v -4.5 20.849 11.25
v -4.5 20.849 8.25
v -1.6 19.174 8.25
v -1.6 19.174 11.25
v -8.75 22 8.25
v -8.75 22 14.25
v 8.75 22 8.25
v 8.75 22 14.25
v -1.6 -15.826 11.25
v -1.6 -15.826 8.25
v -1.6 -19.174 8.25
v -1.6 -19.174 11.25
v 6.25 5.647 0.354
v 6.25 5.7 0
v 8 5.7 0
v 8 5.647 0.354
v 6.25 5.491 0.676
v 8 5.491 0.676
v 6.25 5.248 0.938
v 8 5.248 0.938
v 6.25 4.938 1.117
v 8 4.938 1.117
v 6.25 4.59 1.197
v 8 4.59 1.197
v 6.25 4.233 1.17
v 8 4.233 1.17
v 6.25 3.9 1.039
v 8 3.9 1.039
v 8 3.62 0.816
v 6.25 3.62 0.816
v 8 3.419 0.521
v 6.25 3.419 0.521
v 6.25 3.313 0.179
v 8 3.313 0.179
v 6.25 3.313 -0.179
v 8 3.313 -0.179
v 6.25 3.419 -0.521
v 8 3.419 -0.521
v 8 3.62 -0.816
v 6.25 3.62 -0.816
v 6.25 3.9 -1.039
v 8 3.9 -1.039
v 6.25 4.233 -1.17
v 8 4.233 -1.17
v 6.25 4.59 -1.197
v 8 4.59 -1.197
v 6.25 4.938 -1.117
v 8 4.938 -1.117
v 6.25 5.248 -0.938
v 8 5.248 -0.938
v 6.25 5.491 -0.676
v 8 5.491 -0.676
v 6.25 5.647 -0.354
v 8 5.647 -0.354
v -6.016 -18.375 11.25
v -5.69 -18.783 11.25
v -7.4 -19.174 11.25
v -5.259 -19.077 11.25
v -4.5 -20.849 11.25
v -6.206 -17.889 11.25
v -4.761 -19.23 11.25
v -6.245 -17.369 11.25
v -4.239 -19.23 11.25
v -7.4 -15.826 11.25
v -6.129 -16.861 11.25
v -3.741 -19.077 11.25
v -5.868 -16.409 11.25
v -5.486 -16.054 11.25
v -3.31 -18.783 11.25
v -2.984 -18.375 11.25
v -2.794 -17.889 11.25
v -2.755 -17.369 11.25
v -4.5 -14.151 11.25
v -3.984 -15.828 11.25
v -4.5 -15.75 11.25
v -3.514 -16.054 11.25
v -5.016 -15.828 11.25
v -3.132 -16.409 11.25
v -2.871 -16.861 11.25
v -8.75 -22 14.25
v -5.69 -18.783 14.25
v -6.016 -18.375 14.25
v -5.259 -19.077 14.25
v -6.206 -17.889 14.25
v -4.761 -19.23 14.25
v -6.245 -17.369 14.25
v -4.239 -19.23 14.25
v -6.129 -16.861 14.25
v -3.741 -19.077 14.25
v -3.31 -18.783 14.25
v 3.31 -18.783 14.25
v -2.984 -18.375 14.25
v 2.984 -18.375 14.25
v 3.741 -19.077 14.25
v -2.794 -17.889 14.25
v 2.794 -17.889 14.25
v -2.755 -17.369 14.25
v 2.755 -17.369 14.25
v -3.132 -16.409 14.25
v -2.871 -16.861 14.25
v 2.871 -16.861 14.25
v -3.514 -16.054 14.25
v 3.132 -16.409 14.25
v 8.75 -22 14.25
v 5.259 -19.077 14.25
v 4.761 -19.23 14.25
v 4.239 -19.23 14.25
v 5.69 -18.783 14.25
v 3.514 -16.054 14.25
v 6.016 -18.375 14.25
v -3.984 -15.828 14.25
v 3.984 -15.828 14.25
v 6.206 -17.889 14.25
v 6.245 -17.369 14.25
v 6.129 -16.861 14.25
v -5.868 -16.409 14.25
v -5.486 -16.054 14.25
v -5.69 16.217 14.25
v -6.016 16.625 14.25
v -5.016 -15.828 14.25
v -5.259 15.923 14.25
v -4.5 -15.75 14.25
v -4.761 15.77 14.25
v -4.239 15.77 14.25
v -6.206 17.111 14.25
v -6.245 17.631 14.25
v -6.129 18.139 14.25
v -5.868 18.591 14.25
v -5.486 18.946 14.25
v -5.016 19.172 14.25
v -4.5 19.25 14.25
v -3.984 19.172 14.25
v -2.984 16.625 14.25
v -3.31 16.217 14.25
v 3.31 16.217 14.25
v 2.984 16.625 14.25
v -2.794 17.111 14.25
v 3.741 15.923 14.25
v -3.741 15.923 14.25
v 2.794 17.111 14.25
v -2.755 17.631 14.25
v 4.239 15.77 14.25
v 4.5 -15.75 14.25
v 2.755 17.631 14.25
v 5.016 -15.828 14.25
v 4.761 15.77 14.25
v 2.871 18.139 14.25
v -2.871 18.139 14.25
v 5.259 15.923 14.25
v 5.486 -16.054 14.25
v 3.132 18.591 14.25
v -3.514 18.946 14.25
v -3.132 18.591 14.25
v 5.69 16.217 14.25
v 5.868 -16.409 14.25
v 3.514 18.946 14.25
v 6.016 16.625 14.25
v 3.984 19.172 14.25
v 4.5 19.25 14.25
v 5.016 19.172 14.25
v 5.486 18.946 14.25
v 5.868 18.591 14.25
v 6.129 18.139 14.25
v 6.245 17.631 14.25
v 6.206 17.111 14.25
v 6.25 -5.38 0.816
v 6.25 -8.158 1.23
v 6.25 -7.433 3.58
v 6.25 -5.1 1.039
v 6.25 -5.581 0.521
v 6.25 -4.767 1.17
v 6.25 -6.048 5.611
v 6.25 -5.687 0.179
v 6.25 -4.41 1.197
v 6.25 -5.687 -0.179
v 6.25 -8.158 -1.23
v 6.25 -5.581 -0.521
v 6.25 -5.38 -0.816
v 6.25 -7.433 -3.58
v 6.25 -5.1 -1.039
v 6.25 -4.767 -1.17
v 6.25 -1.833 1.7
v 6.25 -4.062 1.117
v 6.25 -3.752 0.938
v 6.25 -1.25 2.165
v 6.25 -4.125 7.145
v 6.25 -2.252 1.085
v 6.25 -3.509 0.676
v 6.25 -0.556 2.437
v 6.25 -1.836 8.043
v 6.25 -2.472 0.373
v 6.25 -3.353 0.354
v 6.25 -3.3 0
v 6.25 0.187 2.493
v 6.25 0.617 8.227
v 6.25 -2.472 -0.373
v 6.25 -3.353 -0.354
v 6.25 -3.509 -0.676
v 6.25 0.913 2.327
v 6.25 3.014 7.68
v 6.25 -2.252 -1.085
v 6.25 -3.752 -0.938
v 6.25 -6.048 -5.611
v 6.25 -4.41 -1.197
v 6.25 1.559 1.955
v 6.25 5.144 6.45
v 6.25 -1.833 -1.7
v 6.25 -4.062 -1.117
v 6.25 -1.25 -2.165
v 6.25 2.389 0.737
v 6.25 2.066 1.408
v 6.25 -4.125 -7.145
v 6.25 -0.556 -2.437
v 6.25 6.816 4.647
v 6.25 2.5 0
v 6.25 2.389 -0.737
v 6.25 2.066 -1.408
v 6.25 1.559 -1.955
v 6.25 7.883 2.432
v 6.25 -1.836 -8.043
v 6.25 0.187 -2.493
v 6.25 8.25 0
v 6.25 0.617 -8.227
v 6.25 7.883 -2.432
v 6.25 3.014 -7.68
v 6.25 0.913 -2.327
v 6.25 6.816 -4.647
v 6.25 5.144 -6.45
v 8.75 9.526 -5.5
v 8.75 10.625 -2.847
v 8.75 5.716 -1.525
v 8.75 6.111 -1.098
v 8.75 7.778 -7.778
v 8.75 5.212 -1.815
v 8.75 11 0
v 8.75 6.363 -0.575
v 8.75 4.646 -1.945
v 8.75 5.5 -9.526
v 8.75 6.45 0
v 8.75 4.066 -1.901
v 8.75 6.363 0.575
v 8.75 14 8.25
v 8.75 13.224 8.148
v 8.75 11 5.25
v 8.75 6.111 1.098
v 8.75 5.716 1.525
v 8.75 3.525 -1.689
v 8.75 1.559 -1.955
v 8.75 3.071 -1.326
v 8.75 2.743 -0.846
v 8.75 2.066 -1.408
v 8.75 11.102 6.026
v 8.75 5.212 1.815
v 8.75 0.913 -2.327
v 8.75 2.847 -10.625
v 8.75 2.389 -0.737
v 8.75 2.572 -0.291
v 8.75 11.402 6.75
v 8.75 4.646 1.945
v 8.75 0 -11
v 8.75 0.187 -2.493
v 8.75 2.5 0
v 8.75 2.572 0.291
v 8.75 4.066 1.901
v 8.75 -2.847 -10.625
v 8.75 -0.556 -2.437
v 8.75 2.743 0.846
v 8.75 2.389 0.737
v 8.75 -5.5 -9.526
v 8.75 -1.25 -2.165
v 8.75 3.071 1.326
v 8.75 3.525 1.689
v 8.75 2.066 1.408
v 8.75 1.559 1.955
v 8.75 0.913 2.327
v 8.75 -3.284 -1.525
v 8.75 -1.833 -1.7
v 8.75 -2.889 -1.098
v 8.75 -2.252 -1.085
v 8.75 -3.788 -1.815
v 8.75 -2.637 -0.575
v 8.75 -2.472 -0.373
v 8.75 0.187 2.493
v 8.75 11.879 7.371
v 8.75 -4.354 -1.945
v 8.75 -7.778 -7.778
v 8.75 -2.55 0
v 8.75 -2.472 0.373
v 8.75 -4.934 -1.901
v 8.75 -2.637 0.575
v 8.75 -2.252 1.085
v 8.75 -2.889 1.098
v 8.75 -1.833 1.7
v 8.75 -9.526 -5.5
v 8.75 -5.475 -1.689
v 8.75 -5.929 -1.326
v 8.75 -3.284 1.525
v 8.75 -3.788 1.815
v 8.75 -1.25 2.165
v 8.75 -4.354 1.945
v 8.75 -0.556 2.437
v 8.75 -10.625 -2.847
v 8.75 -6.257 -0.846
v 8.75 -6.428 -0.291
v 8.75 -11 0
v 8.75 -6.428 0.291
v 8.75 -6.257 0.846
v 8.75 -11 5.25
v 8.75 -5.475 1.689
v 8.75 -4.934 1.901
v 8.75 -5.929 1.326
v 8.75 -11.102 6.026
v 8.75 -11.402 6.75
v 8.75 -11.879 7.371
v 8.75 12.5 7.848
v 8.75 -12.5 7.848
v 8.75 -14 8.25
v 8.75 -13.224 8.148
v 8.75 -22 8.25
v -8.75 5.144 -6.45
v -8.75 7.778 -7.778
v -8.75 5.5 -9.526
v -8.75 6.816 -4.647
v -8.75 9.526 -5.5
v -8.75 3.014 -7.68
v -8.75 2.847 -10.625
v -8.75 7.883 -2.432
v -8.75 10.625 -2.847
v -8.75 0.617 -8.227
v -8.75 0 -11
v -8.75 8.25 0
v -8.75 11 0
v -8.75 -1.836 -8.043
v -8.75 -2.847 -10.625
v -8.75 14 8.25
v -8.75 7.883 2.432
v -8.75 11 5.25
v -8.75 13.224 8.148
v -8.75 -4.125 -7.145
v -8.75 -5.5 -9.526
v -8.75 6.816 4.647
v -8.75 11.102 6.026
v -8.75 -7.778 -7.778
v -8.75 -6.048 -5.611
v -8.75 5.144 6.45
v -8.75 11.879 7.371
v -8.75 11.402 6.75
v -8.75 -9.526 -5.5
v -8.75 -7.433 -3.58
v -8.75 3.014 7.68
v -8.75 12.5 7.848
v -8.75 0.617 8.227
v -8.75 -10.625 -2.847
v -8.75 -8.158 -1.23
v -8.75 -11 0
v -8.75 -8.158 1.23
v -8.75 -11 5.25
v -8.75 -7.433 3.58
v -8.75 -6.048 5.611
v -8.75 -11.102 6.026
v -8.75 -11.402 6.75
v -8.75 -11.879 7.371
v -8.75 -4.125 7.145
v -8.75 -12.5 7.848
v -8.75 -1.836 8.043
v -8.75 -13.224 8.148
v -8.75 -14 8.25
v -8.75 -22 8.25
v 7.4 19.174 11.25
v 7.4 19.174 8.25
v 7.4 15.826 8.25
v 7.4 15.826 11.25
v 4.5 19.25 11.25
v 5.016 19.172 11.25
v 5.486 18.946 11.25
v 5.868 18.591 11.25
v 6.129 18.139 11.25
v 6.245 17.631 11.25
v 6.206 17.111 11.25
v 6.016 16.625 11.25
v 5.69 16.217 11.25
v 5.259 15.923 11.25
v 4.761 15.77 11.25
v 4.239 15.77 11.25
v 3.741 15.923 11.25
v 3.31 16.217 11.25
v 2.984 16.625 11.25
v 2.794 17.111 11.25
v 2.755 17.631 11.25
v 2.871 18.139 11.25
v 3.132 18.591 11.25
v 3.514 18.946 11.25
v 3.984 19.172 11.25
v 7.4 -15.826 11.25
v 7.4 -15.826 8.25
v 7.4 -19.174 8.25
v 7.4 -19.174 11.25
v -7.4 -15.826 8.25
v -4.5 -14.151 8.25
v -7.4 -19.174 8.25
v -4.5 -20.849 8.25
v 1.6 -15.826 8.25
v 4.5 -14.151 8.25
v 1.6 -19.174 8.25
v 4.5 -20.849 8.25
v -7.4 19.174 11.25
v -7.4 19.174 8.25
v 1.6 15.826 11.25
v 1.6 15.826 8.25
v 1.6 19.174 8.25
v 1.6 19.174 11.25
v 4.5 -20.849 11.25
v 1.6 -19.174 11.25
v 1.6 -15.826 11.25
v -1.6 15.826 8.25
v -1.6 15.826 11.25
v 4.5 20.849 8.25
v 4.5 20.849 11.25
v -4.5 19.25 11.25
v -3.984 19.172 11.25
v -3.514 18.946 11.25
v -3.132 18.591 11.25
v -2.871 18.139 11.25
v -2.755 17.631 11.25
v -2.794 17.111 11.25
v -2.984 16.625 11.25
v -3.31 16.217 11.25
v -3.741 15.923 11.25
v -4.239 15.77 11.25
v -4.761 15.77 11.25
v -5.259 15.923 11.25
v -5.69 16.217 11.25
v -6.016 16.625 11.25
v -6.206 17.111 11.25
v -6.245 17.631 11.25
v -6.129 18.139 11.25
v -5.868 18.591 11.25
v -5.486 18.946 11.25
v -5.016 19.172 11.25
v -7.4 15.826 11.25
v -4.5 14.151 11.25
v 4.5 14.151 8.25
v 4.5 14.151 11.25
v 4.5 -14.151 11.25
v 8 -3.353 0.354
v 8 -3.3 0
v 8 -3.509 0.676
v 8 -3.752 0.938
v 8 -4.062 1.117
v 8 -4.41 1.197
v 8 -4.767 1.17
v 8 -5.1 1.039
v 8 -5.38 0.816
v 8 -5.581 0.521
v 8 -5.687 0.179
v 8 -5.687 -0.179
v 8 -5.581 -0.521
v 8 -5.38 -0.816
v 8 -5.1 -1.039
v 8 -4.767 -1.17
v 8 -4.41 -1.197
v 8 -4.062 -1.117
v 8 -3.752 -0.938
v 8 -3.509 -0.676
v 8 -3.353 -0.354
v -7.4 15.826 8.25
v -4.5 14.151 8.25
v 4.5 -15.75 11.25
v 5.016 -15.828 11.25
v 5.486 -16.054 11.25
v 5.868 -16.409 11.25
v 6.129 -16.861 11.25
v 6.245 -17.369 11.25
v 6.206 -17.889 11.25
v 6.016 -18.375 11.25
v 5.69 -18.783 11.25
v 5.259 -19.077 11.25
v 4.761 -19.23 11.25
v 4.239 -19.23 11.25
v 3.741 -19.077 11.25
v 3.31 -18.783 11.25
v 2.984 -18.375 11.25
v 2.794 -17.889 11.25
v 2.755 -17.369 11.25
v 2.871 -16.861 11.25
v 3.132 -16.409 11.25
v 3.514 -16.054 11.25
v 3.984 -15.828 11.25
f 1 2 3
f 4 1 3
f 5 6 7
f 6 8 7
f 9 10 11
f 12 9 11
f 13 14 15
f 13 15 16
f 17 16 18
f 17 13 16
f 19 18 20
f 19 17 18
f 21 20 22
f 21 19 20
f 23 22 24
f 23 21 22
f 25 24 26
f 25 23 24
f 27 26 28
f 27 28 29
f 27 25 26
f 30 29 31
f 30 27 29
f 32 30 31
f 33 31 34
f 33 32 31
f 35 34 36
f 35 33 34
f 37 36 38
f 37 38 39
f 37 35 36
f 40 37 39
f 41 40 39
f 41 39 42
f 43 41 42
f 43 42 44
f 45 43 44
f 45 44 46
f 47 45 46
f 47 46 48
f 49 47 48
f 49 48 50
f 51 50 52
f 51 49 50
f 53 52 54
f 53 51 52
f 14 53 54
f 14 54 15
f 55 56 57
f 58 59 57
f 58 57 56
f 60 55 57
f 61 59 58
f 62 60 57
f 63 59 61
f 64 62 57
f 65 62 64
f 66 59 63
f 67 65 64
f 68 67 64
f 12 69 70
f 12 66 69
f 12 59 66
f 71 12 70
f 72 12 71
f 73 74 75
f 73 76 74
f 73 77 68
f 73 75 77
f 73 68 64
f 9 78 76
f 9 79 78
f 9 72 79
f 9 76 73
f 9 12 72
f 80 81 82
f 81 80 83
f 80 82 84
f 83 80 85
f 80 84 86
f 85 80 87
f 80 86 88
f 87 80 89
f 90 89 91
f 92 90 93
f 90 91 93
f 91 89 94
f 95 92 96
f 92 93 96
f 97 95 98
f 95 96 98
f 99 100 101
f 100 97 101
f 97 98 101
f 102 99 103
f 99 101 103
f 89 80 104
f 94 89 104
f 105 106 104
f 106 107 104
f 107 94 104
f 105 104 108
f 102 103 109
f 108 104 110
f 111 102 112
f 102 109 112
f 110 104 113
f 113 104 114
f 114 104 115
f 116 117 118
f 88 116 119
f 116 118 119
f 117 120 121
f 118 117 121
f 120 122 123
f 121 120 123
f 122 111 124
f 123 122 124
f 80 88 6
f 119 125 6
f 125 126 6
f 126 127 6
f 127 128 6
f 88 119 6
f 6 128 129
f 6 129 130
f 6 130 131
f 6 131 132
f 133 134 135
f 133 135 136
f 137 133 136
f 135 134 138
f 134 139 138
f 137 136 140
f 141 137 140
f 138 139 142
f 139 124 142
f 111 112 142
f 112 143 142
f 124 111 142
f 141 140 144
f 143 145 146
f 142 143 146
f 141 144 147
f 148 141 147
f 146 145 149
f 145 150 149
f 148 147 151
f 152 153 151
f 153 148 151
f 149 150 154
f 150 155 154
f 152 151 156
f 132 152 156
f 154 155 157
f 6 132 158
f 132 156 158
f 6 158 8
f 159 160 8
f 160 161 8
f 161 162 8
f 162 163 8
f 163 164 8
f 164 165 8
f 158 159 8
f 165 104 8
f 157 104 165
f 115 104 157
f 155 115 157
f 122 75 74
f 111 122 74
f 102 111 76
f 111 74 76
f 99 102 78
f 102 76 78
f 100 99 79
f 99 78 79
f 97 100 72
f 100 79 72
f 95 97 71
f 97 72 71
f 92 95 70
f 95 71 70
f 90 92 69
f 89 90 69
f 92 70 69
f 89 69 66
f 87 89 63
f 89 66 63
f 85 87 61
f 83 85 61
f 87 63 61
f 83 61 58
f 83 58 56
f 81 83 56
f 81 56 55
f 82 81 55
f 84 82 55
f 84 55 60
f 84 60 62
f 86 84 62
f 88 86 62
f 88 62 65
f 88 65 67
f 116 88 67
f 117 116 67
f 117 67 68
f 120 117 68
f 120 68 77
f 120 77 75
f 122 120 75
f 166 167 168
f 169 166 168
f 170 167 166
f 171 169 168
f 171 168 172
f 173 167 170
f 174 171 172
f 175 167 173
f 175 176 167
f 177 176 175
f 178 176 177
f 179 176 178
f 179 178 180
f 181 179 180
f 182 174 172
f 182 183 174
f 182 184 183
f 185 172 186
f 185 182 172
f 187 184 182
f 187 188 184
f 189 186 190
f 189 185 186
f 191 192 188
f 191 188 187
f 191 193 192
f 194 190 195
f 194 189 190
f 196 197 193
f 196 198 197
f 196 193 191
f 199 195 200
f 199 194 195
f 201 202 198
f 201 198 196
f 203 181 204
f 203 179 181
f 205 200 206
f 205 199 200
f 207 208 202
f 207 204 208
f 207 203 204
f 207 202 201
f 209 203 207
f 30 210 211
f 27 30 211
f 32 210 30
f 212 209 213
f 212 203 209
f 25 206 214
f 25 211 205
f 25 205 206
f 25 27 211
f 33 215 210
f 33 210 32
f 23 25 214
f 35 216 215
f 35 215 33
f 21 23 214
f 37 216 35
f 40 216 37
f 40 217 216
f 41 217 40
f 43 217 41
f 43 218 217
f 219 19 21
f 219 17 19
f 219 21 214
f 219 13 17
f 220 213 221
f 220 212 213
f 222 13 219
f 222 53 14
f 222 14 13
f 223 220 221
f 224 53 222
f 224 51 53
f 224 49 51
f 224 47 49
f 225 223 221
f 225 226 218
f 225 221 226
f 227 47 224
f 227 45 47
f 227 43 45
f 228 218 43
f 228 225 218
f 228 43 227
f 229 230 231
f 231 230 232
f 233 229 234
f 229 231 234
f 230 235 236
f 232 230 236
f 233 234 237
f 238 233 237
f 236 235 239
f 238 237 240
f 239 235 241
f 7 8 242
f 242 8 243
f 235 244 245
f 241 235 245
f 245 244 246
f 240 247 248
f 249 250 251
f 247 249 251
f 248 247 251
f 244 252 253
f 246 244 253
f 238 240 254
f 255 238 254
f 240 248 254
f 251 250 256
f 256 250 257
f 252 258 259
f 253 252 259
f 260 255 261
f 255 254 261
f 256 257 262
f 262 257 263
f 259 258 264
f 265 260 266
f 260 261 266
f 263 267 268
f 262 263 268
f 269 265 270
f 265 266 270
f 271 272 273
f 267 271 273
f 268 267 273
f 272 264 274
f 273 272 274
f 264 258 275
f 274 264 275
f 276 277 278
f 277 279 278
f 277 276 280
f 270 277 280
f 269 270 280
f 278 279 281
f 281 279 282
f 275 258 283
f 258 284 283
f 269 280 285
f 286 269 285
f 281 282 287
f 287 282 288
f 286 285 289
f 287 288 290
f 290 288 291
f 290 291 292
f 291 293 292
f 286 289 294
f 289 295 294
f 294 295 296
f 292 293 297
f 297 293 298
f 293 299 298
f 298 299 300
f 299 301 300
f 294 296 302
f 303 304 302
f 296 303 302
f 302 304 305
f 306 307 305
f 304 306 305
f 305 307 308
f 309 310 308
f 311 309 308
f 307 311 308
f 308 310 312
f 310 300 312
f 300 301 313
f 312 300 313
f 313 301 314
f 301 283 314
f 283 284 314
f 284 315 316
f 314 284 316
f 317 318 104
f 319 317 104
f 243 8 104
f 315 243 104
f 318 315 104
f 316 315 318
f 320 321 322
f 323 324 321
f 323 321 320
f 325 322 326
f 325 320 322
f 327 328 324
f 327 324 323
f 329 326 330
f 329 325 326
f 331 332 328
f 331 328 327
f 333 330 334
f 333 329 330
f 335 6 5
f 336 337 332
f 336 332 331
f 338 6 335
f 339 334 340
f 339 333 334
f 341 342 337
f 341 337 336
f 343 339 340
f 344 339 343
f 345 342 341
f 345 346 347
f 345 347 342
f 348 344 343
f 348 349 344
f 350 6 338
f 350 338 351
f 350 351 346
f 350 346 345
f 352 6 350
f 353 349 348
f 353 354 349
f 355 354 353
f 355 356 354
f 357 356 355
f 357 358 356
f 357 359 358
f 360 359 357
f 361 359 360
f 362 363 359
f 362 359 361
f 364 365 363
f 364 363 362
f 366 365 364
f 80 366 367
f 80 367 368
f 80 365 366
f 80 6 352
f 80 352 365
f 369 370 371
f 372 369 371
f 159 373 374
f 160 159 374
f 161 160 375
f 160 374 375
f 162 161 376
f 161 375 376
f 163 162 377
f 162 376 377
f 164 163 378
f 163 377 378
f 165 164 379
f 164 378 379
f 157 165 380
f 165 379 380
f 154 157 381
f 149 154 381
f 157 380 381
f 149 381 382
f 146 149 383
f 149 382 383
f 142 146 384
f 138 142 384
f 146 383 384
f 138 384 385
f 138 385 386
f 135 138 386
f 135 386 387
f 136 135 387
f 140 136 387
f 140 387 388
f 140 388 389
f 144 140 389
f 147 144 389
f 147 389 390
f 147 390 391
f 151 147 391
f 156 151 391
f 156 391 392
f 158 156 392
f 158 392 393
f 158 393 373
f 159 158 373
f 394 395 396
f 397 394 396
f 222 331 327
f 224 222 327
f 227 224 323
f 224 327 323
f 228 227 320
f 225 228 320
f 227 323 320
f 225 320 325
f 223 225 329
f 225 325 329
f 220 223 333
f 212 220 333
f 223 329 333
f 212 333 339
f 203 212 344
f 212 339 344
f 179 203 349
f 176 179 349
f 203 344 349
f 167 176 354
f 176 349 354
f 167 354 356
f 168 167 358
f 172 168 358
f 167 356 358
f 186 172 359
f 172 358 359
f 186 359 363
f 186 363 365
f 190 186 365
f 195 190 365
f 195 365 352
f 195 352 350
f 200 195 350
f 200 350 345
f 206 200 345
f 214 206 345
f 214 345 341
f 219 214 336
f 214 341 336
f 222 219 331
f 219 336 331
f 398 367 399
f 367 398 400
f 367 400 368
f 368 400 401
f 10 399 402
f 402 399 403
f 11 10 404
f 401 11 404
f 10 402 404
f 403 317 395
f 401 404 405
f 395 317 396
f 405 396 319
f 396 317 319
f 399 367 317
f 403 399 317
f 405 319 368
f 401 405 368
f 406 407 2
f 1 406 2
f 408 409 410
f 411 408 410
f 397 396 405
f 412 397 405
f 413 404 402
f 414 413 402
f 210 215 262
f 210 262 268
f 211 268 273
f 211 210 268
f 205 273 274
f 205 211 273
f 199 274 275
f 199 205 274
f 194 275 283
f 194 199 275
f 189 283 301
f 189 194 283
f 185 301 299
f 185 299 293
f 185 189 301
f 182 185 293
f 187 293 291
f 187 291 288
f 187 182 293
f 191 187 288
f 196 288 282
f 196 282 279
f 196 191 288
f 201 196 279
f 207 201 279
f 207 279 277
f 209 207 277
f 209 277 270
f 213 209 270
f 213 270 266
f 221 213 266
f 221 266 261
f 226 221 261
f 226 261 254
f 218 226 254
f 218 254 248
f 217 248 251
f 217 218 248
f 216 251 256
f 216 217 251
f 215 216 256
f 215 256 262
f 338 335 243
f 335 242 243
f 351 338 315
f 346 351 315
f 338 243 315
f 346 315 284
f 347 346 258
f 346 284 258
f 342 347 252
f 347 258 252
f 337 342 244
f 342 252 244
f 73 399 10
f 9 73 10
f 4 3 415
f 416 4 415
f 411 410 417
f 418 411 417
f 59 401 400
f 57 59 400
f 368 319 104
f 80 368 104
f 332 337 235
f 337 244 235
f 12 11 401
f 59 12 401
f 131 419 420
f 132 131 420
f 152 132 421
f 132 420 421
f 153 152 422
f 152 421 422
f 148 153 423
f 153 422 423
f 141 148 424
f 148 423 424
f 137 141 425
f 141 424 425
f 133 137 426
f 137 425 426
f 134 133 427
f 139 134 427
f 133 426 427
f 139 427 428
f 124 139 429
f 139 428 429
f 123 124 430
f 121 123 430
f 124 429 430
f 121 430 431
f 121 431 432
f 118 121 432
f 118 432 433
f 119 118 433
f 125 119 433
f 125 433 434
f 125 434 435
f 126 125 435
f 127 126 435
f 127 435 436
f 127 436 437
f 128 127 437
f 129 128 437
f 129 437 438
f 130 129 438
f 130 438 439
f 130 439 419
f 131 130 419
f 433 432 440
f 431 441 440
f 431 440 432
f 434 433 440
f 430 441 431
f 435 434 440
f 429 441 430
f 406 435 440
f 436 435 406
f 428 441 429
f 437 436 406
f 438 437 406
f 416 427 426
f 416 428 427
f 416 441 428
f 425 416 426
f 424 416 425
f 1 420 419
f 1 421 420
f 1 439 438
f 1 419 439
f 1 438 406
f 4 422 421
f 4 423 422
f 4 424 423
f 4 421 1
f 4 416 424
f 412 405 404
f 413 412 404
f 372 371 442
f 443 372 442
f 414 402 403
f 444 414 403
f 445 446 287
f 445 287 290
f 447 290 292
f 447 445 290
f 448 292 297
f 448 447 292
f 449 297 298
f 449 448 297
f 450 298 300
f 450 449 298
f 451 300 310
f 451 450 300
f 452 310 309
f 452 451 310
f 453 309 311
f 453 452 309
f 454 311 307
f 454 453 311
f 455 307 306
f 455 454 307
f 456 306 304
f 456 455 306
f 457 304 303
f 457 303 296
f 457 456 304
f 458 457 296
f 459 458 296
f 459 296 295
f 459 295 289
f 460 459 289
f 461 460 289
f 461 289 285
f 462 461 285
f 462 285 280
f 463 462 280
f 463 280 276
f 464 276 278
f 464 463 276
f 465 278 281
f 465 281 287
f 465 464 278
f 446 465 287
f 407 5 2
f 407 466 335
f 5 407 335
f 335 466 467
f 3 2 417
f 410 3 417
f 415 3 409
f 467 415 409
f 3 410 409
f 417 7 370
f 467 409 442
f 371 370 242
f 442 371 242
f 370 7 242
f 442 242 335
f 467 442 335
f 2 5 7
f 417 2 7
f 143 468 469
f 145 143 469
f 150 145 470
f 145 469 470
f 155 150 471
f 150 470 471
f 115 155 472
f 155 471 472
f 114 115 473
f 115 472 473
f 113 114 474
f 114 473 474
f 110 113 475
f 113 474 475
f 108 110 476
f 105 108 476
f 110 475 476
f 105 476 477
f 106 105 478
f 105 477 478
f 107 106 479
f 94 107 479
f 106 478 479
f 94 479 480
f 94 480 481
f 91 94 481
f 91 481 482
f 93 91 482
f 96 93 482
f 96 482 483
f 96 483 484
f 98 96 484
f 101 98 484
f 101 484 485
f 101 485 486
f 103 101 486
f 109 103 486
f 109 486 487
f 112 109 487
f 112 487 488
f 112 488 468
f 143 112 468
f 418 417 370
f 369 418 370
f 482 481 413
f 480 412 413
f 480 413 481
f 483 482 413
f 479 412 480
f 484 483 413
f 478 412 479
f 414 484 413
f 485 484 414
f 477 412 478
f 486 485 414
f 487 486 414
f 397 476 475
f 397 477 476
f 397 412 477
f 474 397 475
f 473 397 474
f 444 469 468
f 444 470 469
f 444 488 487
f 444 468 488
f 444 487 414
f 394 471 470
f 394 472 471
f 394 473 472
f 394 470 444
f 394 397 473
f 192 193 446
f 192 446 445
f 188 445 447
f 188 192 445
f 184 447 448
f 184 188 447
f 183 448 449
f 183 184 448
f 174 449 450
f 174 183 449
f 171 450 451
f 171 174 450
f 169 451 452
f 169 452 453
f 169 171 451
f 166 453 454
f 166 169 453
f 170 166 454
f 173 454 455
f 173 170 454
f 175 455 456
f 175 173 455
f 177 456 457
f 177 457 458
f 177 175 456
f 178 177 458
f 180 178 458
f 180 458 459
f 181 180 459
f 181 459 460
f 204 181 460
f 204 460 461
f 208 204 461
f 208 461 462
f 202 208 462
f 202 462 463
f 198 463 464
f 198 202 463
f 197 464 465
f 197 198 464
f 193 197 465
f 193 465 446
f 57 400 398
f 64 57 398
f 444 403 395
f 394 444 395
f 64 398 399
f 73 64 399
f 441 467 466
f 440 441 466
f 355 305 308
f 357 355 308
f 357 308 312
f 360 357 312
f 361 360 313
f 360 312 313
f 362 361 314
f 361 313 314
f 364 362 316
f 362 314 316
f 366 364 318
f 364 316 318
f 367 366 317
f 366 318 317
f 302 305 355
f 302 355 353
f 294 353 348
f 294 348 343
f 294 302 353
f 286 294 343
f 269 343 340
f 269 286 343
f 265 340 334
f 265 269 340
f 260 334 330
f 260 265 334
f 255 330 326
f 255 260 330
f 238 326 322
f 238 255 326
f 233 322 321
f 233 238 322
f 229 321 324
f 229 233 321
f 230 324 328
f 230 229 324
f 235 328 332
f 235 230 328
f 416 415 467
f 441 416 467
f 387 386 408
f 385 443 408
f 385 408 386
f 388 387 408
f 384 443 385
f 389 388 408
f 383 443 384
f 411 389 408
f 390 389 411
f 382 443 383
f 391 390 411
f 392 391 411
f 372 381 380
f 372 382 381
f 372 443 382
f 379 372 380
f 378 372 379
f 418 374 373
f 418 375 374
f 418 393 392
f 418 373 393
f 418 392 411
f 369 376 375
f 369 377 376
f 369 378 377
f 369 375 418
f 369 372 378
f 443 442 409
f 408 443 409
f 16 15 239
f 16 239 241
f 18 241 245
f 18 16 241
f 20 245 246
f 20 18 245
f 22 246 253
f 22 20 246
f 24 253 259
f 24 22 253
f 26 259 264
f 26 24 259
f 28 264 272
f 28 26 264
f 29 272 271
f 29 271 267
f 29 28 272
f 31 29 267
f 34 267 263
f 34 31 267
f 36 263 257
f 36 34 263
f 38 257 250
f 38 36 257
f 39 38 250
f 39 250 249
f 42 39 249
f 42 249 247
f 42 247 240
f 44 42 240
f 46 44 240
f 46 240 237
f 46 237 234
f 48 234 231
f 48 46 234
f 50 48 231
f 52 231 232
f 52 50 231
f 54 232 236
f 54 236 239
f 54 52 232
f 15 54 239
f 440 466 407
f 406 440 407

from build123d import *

# Parameters (mm, degrees)
SKETCH_R        = 1.2
SKETCH_R_2      = 2.5
PAD_DEPTH       = 8.75
SKETCH001_R     = 8.25
POCKET_DEPTH    = 15
POCKET001_DEPTH = 3
SKETCH003_R     = 1.75
POCKET002_DEPTH = 6.001
CHAMFER_SIZE    = 0.75


with BuildPart() as part:
    # Sketch → Pad (new body, symmetric)
    with BuildSketch(Plane.YZ):
        with BuildLine():
            Line((-22, 14.25), (22, 14.25))
            Line((22, 14.25), (22, 8.25))
            Line((22, 8.25), (14, 8.25))
            ThreePointArc((14, 8.25), (11.87868, 7.37132), (11, 5.25))
            Line((11, 5.25), (11, 0))
            ThreePointArc((-11, 0), (0, -11), (11, 0))
            Line((-11, 0), (-11, 5.25))
            ThreePointArc((-11, 5.25), (-11.87868, 7.37132), (-14, 8.25))
            Line((-14, 8.25), (-22, 8.25))
            Line((-22, 8.25), (-22, 14.25))
        make_face()
        with Locations((-4.5, 0)):
            Circle(SKETCH_R, mode=Mode.SUBTRACT)
        with Locations((4.5, 0)):
            Circle(SKETCH_R, mode=Mode.SUBTRACT)
        Circle(SKETCH_R_2, mode=Mode.SUBTRACT)
    extrude(amount=PAD_DEPTH, both=True)

    # Sketch001 (on Face14 of Pad) → Pocket (cut)
    with BuildSketch(Plane(origin=(-8.75, 0, 0), x_dir=(0, 1, 0), z_dir=(-1, 0, 0))):
        Circle(SKETCH001_R)
    extrude(amount=-POCKET_DEPTH, mode=Mode.SUBTRACT)

    # Sketch002 (on Face7 of Pocket) → Pocket001 (cut)
    with BuildSketch(Plane.YX.offset(-8.25)):
        Polygon((-15.825684, 7.4), (-19.174316, 7.4), (-20.848632, 4.5), (-19.174316, 1.6), (-15.825684, 1.6), (-14.151368, 4.5), align=None)
        Polygon((-14.151368, -4.5), (-15.825684, -1.6), (-19.174316, -1.6), (-20.848632, -4.5), (-19.174316, -7.4), (-15.825684, -7.4), align=None)
        Polygon((19.174316, 1.6), (20.848632, 4.5), (19.174316, 7.4), (15.825684, 7.4), (14.151368, 4.5), (15.825684, 1.6), align=None)
        Polygon((19.174316, -7.4), (20.848632, -4.5), (19.174316, -1.6), (15.825684, -1.6), (14.151368, -4.5), (15.825684, -7.4), align=None)
    extrude(amount=-POCKET001_DEPTH, mode=Mode.SUBTRACT)

    # Sketch003 (on Face7 of Pocket001) → Pocket002 (cut, through all)
    with BuildSketch(Plane.YX.offset(-8.25)):
        with Locations((-17.5, 4.5)):
            Circle(SKETCH003_R)
        with Locations((-17.5, -4.5)):
            Circle(SKETCH003_R)
        with Locations((17.5, -4.5)):
            Circle(SKETCH003_R)
        with Locations((17.5, 4.5)):
            Circle(SKETCH003_R)
    extrude(amount=-POCKET002_DEPTH, mode=Mode.SUBTRACT)

    # Chamfer
    chamfer_edges = [part.edges().sort_by_distance(p)[0] for p in [
        (8.75, 3.3, 0),
        (8.75, -5.7, 0),
    ]]
    chamfer(chamfer_edges, length=CHAMFER_SIZE)


solid = part.part
